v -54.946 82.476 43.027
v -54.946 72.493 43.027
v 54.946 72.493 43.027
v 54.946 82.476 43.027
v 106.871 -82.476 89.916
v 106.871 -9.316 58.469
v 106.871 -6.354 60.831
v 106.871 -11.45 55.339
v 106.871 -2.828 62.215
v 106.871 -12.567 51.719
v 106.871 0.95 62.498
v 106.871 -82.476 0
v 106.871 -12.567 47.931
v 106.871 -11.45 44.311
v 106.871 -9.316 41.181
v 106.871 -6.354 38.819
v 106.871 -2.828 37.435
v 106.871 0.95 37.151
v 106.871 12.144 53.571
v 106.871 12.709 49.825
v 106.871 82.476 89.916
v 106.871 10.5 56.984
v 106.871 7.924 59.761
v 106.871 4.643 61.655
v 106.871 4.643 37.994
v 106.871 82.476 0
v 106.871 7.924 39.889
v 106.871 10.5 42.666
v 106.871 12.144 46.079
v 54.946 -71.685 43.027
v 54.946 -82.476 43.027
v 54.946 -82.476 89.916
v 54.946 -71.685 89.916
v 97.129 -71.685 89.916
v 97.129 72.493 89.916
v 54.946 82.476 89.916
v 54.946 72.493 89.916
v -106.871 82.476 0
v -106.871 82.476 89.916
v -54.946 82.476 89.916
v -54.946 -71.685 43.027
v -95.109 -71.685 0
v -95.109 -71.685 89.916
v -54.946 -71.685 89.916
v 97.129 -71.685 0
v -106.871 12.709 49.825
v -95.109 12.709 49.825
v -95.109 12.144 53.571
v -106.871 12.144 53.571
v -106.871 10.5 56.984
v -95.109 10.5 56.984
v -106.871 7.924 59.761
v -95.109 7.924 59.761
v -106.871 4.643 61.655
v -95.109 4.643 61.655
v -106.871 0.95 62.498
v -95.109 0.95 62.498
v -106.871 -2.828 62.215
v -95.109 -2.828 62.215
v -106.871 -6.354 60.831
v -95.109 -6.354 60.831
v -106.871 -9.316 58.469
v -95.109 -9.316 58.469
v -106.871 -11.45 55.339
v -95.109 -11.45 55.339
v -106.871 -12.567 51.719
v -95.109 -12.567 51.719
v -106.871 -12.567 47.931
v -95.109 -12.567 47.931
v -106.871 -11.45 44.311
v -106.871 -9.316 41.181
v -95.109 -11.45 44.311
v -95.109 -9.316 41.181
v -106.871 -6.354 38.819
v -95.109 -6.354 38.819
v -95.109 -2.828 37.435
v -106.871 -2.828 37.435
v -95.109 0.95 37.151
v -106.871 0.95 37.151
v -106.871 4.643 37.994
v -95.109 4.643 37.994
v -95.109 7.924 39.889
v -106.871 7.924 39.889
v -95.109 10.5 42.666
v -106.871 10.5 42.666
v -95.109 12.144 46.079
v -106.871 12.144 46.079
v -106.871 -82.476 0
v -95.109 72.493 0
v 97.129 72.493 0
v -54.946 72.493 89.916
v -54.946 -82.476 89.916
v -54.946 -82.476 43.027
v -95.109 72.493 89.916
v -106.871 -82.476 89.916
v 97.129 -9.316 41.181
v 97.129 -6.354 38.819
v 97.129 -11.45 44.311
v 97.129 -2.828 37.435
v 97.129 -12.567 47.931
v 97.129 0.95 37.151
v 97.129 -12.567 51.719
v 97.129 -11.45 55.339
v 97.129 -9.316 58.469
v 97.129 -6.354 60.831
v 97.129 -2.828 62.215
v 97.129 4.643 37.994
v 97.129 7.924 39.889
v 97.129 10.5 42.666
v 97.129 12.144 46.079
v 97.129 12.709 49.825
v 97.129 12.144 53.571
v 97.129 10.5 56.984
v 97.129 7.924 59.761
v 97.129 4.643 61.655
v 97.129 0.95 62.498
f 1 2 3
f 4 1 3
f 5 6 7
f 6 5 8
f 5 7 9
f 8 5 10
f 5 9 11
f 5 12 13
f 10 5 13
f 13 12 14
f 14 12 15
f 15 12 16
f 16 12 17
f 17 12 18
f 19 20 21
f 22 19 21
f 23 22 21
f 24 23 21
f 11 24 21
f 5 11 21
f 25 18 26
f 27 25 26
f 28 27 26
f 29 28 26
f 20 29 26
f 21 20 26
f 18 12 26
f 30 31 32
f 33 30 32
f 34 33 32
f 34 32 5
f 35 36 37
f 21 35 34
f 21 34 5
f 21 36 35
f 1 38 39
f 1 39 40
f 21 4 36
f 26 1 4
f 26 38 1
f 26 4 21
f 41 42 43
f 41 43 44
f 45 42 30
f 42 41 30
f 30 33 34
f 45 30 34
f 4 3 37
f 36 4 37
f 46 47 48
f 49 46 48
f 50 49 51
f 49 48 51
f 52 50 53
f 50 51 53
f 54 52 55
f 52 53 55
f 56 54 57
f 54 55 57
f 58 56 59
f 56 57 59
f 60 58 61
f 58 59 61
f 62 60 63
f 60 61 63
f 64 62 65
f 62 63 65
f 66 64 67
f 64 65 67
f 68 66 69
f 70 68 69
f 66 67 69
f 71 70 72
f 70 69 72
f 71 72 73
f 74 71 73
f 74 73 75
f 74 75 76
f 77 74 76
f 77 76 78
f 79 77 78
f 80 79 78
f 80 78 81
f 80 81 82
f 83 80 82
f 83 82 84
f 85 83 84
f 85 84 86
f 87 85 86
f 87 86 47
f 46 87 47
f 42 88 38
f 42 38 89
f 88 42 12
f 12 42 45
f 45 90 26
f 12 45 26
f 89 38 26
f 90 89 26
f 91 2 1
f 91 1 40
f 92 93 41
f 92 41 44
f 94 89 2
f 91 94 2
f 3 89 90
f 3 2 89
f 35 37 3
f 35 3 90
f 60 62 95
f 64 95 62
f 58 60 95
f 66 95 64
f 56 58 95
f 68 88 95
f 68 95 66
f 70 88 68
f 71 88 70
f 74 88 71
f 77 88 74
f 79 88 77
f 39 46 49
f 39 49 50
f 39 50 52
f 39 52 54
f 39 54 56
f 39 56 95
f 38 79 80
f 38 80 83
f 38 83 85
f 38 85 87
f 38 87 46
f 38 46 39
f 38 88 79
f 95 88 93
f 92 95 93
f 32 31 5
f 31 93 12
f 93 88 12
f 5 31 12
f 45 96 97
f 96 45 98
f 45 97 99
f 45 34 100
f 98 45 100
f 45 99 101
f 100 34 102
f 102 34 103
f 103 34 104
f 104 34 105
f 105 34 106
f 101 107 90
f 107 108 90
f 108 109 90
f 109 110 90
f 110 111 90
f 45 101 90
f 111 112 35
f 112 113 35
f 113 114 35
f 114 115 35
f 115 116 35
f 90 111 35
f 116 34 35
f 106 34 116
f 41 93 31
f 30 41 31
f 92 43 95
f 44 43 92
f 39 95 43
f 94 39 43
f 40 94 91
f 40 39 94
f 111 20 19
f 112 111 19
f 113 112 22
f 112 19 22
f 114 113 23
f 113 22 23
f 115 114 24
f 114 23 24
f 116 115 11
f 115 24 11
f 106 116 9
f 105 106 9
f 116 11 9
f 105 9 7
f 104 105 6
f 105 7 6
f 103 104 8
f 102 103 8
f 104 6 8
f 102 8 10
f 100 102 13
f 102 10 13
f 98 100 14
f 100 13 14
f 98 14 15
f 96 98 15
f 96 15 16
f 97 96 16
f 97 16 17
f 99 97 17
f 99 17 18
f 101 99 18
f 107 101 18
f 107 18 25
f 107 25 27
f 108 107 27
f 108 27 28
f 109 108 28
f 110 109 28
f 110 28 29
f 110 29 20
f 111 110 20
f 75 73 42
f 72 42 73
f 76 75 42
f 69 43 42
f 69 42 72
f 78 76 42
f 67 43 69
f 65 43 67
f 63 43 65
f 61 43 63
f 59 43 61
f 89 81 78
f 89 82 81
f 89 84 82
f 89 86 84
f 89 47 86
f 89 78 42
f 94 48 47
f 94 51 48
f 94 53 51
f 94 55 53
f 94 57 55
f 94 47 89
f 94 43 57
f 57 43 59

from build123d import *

# Parameters (mm, degrees)
F0_W     = 213.741392
F0_H     = 164.952264
F1_DEPTH = 89.916
F2_W     = 192.237719
F2_H     = 144.178293
F3_DEPTH = 137.668
F4_W     = 109.89108
F4_H     = 46.888998
F5_DEPTH = 190.246
F6_R     = 12.708744
F7_DEPTH = 299.212


with BuildPart() as f1:
    # F0 (on Top) → F1 (new body)
    with BuildSketch(Plane.XY):
        Rectangle(F0_W, F0_H)
    extrude(amount=F1_DEPTH)

    # F2 (on face) → F3 (cut)
    with BuildSketch(Plane.XY.offset(89.916)):
        with Locations((1.00965, 0.403863)):
            Rectangle(F2_W, F2_H)
    extrude(amount=-F3_DEPTH, mode=Mode.SUBTRACT)

    # F4 (on face) → F5 (cut)
    with BuildSketch(Plane.XZ.offset(82.476132)):
        with Locations((0, 66.471501)):
            Rectangle(F4_W, F4_H)
    extrude(amount=-F5_DEPTH, mode=Mode.SUBTRACT)

    # F6 (on face) → F7 (cut)
    with BuildSketch(Plane.YZ.offset(106.870696)):
        with Locations((0, 49.824677)):
            Circle(F6_R)
    extrude(amount=-F7_DEPTH, mode=Mode.SUBTRACT)


solid = f1.part
